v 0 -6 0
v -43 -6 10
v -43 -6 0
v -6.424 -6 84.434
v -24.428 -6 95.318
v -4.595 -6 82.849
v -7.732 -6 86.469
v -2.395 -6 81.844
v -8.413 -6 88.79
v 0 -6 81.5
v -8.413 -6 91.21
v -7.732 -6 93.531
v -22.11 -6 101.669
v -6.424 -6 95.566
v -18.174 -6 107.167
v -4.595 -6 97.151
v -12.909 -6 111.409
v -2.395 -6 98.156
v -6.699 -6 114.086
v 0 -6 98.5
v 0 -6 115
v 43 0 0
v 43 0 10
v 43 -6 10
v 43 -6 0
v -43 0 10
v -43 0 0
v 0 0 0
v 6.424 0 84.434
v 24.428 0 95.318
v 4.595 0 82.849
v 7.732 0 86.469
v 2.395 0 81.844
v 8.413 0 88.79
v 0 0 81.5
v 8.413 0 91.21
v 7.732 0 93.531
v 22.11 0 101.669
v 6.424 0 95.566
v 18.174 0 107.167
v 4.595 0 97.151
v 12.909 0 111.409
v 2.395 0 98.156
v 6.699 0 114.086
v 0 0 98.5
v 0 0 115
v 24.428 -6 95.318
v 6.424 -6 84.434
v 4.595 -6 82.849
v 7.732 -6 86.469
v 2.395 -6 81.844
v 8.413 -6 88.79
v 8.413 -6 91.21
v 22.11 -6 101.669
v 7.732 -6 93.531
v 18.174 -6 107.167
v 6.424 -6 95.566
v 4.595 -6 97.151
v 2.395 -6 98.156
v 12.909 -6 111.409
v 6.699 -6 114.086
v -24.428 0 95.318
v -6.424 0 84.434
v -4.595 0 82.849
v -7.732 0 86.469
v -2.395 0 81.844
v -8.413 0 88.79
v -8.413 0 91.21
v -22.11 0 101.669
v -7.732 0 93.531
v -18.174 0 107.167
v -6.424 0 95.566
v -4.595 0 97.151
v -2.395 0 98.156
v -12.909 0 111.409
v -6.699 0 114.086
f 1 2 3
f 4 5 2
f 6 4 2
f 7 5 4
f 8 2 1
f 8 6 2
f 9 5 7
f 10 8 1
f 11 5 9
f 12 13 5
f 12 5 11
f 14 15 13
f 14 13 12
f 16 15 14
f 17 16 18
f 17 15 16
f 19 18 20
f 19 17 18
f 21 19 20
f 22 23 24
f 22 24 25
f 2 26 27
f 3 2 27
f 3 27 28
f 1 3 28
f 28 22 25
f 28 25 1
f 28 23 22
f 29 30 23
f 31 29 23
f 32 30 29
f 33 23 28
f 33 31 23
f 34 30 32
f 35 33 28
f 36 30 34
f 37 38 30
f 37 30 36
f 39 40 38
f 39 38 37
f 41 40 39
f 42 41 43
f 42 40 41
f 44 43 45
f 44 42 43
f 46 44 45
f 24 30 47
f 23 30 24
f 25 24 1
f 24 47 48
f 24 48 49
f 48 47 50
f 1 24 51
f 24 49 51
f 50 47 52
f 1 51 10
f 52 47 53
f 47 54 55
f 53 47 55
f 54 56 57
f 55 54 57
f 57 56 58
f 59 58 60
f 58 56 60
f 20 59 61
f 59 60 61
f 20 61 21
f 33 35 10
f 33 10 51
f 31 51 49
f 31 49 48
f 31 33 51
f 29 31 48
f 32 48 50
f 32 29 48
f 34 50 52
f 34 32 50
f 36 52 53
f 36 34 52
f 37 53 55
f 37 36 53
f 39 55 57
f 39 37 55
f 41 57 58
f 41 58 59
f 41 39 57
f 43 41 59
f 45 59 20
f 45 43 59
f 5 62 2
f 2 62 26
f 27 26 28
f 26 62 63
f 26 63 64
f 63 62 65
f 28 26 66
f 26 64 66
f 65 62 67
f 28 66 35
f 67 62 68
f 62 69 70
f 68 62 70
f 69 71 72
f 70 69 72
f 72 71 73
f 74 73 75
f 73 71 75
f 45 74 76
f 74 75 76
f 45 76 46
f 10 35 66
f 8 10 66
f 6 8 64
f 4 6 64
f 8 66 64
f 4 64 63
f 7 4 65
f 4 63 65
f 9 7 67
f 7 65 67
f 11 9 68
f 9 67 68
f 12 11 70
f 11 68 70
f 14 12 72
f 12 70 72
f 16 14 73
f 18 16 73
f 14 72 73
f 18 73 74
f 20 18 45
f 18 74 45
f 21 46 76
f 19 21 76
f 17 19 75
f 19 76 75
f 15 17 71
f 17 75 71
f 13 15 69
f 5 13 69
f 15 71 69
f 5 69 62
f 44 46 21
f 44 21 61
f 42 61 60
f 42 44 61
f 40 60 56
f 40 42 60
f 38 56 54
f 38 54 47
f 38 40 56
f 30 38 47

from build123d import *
from build123d import SkipClean  # not in build123d's __all__

# Parameters (mm, degrees)
F1_DEPTH = 6


with BuildPart() as f1:
    # F0 (on Front) → F1 (new body)
    with BuildSketch(Plane.XZ):
        with BuildLine():
            Line((-43, 0), (0, 0))
            Line((0, 0), (0, 81.5))
            ThreePointArc((0, 81.5), (-8.5, 90), (0, 98.5))
            Line((0, 98.5), (0, 115))
            ThreePointArc((0, 115), (-15.6853772226, 109.4671246306), (-24.4279354617, 95.3175153107))
            Line((-24.4279354617, 95.3175153107), (-43, 10))
            Line((-43, 10), (-43, 0))
        make_face()
    extrude(amount=F1_DEPTH)

    # F2: F1 across plane


with BuildPart() as f1_1:
    add(f1.part, clean=False)
    with SkipClean():  # cleaning this boolean's faces spoils the solid; the shape is the same uncleaned
        add(f1.part.mirror(Plane.YZ), clean=False)


solid = f1_1.part
